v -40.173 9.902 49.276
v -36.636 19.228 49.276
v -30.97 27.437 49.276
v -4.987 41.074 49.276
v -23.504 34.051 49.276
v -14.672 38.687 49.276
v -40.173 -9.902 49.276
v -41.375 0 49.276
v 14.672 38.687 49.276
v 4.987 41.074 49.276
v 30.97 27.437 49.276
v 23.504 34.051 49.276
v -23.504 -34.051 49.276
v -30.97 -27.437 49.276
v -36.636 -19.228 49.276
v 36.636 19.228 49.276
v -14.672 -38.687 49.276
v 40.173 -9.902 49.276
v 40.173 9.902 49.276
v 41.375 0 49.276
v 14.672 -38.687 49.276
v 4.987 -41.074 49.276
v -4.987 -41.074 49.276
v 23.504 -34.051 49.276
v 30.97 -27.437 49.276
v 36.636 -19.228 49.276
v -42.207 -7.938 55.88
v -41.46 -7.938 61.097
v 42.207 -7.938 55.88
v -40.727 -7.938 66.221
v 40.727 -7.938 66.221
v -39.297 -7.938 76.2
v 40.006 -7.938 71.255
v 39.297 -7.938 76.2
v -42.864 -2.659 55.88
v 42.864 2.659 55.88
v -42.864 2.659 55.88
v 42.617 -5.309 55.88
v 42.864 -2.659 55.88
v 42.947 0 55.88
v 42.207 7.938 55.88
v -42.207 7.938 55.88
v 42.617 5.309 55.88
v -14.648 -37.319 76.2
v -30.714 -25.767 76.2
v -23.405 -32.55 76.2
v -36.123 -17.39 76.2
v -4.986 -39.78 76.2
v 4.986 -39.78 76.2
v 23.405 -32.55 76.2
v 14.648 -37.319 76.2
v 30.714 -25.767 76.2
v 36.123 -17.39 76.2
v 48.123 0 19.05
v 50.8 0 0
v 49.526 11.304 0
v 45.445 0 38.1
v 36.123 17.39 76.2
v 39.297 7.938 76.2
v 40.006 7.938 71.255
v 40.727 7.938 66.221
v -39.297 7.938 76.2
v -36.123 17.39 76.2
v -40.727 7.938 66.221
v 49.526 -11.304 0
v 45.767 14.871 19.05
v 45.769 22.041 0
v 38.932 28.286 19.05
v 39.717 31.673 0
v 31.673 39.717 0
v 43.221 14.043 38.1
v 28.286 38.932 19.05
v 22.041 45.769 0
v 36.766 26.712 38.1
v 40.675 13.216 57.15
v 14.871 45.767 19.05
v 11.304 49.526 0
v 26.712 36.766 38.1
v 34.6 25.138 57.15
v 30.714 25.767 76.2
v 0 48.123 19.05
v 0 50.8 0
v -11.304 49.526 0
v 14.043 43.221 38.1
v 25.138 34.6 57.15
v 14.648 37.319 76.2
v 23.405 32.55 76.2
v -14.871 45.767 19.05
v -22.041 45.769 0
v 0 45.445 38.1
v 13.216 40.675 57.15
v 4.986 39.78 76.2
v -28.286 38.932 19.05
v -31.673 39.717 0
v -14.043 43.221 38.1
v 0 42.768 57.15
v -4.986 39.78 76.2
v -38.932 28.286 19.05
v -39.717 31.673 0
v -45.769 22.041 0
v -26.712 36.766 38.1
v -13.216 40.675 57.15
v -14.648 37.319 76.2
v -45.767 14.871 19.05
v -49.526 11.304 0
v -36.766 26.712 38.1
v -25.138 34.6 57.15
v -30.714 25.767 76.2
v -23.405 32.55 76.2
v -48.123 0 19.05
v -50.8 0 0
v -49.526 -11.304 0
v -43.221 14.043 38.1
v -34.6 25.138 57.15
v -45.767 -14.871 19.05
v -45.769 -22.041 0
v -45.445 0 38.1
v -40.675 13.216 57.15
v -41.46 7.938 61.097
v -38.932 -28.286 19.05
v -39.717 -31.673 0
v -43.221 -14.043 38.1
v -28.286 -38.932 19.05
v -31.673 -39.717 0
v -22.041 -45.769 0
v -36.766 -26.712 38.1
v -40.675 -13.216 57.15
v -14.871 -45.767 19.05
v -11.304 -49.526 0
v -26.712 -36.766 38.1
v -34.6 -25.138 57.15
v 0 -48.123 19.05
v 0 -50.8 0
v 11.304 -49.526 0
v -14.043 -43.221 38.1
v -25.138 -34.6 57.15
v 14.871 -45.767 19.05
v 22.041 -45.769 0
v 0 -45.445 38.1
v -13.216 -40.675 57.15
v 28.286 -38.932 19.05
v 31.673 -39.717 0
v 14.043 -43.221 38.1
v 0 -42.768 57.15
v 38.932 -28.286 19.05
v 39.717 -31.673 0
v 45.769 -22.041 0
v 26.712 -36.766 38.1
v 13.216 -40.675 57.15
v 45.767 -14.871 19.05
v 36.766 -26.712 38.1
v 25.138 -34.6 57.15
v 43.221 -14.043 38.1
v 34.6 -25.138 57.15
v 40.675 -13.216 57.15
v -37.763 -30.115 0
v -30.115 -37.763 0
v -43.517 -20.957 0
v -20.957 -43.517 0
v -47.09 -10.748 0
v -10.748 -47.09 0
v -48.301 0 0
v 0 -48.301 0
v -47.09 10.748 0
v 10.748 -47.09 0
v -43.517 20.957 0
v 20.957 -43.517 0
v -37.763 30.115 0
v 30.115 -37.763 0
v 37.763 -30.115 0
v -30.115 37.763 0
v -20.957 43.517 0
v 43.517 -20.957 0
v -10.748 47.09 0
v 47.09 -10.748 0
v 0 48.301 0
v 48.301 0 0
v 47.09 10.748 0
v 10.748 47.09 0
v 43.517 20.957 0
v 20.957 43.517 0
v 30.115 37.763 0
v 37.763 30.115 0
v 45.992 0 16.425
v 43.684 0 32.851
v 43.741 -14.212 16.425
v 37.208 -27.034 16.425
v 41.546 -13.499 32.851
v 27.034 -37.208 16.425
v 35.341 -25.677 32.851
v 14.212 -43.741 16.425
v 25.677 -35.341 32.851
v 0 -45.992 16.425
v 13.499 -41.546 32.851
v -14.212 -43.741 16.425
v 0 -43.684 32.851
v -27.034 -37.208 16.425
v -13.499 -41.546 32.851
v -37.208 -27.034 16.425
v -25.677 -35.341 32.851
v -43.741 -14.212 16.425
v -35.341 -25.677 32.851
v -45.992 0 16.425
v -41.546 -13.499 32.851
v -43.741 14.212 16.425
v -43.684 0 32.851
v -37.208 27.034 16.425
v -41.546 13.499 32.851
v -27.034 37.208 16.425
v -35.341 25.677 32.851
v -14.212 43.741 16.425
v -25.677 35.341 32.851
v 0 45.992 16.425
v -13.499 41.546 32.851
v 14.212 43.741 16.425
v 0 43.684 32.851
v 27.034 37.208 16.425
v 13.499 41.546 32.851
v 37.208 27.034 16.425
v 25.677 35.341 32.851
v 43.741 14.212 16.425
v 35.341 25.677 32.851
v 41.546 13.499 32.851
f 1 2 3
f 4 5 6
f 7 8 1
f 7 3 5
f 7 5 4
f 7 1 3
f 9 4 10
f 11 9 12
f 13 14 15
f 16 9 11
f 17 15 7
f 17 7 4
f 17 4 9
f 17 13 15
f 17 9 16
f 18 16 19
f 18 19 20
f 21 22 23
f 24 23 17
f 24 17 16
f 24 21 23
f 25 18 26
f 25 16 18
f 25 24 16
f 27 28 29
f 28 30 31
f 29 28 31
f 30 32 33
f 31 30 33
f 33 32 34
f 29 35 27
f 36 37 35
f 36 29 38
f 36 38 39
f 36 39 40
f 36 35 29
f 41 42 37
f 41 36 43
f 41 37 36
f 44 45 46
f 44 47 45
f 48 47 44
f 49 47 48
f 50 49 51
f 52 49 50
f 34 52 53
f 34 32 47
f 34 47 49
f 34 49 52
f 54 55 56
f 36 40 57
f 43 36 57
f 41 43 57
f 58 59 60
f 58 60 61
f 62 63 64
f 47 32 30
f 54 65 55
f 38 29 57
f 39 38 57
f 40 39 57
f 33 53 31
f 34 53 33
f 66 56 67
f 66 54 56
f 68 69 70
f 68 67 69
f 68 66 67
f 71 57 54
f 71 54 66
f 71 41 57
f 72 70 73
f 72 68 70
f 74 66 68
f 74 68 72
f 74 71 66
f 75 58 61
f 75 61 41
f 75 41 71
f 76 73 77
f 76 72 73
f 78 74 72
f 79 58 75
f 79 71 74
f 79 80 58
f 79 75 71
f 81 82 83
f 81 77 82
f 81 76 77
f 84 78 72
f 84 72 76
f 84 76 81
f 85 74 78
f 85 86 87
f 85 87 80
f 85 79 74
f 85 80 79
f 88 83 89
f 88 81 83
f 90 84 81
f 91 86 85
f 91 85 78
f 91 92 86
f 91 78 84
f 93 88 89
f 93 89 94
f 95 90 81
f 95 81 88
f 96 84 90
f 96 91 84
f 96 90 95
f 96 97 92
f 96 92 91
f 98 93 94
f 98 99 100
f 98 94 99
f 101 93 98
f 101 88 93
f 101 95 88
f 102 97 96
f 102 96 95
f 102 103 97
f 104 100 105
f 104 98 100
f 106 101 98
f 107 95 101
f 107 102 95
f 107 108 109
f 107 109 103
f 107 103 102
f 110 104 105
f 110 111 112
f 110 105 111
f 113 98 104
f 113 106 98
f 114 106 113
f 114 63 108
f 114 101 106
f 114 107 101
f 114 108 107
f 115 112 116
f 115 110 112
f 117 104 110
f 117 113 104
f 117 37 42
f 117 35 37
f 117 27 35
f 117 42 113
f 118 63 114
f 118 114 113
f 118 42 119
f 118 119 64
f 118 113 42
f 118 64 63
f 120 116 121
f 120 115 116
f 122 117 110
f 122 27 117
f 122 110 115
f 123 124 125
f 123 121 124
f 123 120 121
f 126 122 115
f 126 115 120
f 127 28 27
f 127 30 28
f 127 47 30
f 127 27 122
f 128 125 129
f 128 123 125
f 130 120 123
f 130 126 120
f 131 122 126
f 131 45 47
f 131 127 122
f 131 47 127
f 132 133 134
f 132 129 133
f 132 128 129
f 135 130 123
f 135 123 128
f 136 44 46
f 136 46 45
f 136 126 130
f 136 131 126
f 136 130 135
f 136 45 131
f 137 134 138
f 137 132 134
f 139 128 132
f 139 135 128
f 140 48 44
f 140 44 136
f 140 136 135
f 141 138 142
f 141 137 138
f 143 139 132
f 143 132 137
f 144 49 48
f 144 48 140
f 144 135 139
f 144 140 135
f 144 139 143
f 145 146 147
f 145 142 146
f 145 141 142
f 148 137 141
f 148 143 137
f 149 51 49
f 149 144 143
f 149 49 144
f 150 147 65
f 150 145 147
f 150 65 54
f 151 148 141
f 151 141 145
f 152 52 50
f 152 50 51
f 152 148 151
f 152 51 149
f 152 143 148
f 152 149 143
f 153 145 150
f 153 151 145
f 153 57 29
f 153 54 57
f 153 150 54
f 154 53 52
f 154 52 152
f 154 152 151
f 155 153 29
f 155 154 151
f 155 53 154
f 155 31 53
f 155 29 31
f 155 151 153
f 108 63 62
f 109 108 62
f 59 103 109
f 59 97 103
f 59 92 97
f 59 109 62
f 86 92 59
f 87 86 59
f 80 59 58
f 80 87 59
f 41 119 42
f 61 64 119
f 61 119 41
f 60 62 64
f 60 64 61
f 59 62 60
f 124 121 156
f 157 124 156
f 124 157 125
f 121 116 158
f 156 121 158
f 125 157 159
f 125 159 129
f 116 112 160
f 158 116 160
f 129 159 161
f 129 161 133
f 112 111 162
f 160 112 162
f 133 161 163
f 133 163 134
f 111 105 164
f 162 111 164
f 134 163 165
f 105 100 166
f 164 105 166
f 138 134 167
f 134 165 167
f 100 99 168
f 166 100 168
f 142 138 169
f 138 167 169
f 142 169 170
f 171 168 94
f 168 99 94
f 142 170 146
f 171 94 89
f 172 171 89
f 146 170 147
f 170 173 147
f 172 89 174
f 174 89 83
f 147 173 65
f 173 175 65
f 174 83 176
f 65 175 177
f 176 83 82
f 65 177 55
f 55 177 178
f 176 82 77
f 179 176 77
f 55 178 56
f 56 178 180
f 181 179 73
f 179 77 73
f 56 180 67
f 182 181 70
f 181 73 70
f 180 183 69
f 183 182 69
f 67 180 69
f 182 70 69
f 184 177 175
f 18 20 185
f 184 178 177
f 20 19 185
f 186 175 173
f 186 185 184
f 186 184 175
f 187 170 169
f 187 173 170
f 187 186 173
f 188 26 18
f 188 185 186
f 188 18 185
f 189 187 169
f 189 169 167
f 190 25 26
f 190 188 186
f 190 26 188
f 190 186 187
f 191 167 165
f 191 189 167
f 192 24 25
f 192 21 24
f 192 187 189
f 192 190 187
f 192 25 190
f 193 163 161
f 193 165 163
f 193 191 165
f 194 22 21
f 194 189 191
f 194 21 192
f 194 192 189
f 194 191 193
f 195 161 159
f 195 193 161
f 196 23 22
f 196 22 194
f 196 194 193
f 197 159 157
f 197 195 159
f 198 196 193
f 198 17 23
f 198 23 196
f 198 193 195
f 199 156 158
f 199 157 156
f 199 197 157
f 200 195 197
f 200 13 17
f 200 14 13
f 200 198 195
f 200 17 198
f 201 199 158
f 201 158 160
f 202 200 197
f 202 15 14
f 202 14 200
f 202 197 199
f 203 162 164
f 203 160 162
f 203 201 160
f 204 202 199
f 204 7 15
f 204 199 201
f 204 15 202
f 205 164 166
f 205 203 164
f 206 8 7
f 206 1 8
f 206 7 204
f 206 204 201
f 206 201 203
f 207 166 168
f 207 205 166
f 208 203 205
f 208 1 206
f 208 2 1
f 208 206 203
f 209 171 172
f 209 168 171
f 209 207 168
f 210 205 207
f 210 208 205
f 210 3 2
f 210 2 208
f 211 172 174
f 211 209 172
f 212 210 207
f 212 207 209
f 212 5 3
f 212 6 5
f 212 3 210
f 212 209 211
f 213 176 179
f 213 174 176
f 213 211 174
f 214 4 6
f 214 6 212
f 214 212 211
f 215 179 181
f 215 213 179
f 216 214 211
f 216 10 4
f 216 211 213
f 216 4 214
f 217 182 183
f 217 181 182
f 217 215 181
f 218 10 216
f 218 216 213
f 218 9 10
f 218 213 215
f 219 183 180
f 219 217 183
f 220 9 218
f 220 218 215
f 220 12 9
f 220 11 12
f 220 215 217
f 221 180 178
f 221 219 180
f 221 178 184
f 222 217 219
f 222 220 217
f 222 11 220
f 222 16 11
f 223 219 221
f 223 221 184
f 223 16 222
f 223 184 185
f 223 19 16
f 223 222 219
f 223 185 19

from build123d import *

# Parameters (mm, degrees)
F0_R     = 50.8
F1_DEPTH = 76.2
F1_TAPER = 8
F2_W     = 127
F2_H     = 15.875
F3_DEPTH = 20.32
F4_R     = 48.30064
F5_DEPTH = 49.276
F5_TAPER = 8


with BuildPart() as f1:
    # F0 (on Top) → F1 (new body)
    with BuildSketch(Plane.XY):
        Circle(F0_R)
    extrude(amount=F1_DEPTH, taper=F1_TAPER)

    # F2 (on face) → F3 (cut)
    with BuildSketch(Plane.XY.offset(76.2)):
        Rectangle(F2_W, F2_H)
    extrude(amount=-F3_DEPTH, mode=Mode.SUBTRACT)

    # F4 (on face) → F5 (cut)
    with BuildSketch(Plane(origin=(0, 0, 0), x_dir=(1, 0, 0), z_dir=(0, 0, -1))):
        Circle(F4_R)
    extrude(amount=-F5_DEPTH, taper=F5_TAPER, mode=Mode.SUBTRACT)


solid = f1.part
